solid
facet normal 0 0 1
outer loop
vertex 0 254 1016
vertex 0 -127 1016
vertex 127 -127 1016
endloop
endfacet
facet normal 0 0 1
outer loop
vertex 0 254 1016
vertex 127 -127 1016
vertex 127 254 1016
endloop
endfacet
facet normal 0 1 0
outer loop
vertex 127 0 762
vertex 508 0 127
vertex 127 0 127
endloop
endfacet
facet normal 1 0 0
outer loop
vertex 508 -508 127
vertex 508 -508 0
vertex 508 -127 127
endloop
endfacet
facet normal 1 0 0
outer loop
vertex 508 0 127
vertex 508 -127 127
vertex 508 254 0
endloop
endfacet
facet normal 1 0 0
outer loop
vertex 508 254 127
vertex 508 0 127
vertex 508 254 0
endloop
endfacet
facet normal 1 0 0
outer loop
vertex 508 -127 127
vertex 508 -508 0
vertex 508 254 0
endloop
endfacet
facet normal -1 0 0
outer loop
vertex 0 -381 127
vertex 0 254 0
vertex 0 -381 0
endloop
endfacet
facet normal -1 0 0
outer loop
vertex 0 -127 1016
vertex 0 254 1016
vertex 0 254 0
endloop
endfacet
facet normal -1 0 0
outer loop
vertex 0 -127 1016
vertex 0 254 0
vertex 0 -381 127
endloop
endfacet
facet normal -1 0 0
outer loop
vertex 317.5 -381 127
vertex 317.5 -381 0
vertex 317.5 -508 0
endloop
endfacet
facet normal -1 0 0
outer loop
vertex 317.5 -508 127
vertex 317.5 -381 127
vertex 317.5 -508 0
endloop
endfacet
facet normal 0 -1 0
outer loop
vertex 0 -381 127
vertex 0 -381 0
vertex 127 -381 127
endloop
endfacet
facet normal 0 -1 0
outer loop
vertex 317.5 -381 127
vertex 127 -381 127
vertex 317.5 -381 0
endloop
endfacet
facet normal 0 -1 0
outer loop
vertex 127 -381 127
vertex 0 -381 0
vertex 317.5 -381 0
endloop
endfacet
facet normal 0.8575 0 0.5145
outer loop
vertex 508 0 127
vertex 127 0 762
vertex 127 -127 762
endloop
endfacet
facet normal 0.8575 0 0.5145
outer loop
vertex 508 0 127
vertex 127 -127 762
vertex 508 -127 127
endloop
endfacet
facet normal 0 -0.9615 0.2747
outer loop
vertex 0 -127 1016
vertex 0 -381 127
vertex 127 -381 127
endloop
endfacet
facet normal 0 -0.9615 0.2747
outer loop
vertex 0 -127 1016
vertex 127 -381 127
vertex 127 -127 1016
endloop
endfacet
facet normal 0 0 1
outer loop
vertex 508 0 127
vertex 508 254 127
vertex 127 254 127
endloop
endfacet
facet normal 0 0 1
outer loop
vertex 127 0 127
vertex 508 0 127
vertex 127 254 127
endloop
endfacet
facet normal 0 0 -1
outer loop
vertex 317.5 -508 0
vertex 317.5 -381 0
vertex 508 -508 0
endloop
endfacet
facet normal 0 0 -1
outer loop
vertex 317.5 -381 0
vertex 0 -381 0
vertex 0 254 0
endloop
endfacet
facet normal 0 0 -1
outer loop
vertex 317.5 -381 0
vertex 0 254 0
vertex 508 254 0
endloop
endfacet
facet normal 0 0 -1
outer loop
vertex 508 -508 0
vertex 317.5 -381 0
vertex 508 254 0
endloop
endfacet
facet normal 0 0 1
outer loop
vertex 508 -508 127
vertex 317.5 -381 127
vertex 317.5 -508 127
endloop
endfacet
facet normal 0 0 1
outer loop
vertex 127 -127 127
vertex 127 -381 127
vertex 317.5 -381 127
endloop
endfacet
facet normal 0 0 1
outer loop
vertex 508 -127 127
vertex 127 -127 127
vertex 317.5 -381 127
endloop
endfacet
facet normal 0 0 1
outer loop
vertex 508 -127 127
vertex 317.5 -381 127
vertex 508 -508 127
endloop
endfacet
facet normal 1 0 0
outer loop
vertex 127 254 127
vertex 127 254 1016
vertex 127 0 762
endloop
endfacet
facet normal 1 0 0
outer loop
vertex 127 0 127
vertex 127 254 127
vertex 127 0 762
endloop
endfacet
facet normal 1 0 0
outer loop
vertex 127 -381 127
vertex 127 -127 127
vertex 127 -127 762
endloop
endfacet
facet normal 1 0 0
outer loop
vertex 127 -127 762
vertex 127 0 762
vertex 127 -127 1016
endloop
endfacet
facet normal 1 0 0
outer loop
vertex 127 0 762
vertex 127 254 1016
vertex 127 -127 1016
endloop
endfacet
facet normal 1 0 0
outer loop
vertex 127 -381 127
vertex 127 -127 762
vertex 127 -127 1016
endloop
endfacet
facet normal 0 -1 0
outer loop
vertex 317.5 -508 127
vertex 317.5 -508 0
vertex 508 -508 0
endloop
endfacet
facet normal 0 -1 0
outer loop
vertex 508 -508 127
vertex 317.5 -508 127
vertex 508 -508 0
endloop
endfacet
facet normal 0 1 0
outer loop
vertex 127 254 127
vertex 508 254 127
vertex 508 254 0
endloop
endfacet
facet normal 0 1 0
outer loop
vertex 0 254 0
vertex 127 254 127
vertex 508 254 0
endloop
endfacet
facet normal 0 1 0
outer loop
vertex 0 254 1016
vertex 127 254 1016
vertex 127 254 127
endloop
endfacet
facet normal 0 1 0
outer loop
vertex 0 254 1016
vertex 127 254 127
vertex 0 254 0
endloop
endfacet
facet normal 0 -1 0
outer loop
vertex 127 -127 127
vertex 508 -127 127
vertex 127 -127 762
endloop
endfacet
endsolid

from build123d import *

# Parameters (mm, degrees)
F1_DEPTH = 127
F3_DEPTH = 127
F5_DEPTH = 381
F6_DEPTH = 254


with BuildPart() as f1:
    # F0 (on Top) → F1 (new body)
    with BuildSketch(Plane.XY):
        Polygon((508, 254), (0, 254), (0, -381), (317.5, -381), (317.5, -508), (508, -508), align=None)
    extrude(amount=F1_DEPTH)

    # F2 (on face) → F3 (join)
    with BuildSketch(Plane(origin=(0, 0, 0), x_dir=(0, -1, 0), z_dir=(-1, 0, 0))):
        Polygon((-254, 1016), (-254, 127), (381, 127), (127, 1016), align=None)
    extrude(amount=-F3_DEPTH)

    # F4 (on face) → F5 (join)
    with BuildSketch(Plane(origin=(0, 254, 0), x_dir=(-1, 0, 0), z_dir=(0, 1, 0))):
        Polygon((-508, 127), (-127, 127), (-127, 762), align=None)
    extrude(amount=-F5_DEPTH)

    # F4 (on face) → F6 (cut)
    with BuildSketch(Plane(origin=(0, 254, 0), x_dir=(-1, 0, 0), z_dir=(0, 1, 0))):
        Polygon((-508, 127), (-127, 127), (-127, 762), align=None)
    extrude(amount=-F6_DEPTH, mode=Mode.SUBTRACT)


solid = f1.part
